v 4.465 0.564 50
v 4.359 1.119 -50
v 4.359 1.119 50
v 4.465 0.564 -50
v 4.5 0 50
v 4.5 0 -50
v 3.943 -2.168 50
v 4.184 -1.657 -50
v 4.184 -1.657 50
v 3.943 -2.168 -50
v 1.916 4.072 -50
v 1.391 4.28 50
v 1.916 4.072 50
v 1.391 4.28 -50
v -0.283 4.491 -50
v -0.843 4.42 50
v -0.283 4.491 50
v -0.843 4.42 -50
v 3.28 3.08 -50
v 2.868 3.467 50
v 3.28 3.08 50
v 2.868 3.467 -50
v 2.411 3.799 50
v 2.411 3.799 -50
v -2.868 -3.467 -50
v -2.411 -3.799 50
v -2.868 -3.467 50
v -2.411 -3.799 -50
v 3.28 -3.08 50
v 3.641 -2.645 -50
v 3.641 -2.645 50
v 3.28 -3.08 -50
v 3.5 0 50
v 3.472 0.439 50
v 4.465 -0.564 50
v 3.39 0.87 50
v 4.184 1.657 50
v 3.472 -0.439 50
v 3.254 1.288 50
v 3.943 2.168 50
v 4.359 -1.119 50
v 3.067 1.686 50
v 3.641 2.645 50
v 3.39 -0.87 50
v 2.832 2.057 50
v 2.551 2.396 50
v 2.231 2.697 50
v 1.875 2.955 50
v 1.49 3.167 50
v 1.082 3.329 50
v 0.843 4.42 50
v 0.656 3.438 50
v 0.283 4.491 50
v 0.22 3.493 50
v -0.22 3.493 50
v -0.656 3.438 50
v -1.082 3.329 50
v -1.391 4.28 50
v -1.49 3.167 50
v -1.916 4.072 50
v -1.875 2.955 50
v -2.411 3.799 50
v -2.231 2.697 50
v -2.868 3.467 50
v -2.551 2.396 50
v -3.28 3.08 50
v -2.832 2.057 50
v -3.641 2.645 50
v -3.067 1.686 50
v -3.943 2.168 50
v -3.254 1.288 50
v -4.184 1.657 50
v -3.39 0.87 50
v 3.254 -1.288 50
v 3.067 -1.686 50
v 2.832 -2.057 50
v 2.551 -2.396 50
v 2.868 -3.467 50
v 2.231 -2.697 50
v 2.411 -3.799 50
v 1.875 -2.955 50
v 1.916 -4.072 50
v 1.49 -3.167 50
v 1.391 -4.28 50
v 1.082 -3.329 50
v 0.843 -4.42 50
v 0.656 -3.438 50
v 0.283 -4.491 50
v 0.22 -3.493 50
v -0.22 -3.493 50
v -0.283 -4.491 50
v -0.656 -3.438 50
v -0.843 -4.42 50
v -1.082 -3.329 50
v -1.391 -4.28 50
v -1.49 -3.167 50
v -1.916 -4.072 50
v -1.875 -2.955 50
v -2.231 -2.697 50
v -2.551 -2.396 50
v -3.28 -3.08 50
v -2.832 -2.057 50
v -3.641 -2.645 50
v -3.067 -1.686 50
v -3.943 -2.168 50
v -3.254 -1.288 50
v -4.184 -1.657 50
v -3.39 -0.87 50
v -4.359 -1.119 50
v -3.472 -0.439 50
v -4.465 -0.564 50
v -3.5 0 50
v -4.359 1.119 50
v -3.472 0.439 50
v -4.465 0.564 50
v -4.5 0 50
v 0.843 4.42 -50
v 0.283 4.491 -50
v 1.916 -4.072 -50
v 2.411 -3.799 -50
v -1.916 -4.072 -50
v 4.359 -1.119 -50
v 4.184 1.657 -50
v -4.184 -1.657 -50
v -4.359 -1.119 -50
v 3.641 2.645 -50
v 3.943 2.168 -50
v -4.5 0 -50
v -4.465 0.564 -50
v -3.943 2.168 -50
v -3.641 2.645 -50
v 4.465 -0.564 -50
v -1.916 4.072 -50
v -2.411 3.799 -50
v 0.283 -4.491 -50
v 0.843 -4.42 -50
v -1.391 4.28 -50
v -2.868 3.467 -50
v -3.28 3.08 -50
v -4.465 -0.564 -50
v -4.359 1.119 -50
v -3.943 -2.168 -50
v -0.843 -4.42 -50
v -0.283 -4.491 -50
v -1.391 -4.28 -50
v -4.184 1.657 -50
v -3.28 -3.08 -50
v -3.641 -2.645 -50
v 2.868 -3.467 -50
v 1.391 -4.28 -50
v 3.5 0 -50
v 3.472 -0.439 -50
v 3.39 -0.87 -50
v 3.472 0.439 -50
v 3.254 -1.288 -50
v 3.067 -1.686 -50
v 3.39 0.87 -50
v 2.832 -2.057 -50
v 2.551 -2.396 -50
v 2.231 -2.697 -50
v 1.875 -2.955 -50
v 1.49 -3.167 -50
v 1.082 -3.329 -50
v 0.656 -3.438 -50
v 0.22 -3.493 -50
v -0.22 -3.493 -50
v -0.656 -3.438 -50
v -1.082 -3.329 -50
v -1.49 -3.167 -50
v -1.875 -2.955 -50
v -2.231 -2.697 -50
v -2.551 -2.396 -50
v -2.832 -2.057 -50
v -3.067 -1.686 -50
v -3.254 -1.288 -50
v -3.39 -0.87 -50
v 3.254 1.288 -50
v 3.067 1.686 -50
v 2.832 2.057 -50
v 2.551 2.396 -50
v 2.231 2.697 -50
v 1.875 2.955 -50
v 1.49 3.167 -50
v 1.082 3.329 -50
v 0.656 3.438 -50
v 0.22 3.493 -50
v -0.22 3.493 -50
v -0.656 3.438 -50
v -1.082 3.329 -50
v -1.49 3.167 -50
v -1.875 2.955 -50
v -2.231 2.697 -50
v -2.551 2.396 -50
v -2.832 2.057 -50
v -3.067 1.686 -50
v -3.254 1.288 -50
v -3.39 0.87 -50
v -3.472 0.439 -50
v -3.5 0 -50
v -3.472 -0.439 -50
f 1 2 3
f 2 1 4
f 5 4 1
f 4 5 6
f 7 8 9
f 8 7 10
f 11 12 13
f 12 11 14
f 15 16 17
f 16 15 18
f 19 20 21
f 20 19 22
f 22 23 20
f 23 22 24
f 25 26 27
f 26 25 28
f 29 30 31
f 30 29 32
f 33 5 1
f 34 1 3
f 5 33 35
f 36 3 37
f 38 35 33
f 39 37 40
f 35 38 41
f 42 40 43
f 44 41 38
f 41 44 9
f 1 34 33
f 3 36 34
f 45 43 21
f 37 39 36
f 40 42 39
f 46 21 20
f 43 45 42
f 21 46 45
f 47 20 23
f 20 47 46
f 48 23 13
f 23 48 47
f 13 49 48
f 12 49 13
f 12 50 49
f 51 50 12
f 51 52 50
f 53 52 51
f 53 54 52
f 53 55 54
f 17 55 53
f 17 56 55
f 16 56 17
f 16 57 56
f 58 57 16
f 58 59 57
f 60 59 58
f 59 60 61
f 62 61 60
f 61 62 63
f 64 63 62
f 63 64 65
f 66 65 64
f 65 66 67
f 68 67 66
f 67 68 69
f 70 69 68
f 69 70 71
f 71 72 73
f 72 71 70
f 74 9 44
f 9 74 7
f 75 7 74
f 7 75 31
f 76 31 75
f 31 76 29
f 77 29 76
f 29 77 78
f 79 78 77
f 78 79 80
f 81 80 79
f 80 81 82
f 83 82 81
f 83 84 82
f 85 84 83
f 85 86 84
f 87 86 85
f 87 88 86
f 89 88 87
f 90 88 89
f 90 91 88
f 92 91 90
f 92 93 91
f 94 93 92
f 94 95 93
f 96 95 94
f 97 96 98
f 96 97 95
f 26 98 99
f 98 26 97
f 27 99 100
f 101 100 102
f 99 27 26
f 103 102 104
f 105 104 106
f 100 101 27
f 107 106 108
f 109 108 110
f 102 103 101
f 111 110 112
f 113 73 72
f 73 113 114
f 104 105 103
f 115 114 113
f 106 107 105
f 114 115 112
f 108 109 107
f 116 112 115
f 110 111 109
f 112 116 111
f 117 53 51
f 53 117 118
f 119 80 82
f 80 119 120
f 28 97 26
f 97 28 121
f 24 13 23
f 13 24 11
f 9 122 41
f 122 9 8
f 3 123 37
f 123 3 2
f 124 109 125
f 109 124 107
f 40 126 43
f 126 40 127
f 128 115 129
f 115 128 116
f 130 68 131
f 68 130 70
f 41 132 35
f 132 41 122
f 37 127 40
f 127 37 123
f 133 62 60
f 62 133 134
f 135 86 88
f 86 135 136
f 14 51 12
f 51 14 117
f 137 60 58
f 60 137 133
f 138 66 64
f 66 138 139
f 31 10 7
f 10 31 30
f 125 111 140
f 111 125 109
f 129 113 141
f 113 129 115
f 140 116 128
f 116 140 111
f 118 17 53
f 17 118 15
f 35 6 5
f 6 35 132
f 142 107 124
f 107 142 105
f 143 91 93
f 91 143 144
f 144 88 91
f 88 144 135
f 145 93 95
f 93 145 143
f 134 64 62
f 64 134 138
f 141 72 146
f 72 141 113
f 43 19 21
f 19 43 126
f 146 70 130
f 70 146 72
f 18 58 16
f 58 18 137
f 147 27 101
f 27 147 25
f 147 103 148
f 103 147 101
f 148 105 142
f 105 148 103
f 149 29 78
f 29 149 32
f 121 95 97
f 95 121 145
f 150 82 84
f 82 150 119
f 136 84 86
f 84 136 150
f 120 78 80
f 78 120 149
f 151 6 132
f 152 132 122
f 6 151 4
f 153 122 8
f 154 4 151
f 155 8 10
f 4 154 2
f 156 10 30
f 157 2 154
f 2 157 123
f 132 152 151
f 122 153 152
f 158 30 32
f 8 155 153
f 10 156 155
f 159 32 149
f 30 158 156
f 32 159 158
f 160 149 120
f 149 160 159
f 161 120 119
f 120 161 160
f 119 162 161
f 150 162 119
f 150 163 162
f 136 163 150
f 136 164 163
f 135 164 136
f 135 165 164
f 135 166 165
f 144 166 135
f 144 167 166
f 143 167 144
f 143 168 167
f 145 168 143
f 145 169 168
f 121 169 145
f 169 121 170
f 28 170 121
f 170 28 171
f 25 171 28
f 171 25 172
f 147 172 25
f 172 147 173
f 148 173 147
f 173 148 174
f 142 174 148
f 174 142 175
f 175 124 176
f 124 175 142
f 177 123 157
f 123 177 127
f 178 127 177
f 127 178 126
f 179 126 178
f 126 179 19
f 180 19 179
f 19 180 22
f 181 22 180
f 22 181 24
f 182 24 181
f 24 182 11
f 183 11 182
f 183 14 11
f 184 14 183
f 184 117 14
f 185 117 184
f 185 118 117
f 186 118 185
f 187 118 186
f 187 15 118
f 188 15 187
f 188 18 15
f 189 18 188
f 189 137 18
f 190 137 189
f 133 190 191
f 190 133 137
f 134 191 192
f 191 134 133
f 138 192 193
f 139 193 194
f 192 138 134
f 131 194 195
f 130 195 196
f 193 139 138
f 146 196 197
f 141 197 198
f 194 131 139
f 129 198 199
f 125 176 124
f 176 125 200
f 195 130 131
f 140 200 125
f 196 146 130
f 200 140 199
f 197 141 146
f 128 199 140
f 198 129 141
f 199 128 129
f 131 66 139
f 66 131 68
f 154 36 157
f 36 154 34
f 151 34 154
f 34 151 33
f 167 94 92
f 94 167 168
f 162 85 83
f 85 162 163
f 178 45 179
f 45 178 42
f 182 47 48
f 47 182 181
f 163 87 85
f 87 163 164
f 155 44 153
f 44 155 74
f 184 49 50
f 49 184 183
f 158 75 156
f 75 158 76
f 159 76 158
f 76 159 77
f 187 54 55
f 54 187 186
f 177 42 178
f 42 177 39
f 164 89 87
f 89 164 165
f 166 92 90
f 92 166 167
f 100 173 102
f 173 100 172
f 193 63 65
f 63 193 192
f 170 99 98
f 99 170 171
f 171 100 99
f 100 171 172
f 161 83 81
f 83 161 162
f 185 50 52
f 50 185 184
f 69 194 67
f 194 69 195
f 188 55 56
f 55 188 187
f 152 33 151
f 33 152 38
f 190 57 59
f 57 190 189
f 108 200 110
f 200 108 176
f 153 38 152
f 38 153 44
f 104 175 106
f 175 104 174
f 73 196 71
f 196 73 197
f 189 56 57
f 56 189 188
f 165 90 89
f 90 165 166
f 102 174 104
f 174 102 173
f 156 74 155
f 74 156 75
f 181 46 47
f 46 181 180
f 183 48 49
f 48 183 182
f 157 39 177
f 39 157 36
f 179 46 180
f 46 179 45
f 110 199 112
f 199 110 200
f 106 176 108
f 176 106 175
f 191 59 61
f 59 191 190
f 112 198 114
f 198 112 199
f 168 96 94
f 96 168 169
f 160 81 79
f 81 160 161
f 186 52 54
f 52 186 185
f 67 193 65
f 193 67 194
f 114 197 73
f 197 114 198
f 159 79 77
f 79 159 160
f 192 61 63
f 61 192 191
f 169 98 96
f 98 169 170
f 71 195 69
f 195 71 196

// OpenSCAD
$fn = 50;


difference() {
	union() {
		translate(v = [0, 0, -50.0000000000]) {
			cylinder(h = 100, r = 4.5000000000);
		}
	}
	union() {
		translate(v = [0, 0, -100.0000000000]) {
			cylinder(h = 200, r = 3.5000000000);
		}
	}
}
